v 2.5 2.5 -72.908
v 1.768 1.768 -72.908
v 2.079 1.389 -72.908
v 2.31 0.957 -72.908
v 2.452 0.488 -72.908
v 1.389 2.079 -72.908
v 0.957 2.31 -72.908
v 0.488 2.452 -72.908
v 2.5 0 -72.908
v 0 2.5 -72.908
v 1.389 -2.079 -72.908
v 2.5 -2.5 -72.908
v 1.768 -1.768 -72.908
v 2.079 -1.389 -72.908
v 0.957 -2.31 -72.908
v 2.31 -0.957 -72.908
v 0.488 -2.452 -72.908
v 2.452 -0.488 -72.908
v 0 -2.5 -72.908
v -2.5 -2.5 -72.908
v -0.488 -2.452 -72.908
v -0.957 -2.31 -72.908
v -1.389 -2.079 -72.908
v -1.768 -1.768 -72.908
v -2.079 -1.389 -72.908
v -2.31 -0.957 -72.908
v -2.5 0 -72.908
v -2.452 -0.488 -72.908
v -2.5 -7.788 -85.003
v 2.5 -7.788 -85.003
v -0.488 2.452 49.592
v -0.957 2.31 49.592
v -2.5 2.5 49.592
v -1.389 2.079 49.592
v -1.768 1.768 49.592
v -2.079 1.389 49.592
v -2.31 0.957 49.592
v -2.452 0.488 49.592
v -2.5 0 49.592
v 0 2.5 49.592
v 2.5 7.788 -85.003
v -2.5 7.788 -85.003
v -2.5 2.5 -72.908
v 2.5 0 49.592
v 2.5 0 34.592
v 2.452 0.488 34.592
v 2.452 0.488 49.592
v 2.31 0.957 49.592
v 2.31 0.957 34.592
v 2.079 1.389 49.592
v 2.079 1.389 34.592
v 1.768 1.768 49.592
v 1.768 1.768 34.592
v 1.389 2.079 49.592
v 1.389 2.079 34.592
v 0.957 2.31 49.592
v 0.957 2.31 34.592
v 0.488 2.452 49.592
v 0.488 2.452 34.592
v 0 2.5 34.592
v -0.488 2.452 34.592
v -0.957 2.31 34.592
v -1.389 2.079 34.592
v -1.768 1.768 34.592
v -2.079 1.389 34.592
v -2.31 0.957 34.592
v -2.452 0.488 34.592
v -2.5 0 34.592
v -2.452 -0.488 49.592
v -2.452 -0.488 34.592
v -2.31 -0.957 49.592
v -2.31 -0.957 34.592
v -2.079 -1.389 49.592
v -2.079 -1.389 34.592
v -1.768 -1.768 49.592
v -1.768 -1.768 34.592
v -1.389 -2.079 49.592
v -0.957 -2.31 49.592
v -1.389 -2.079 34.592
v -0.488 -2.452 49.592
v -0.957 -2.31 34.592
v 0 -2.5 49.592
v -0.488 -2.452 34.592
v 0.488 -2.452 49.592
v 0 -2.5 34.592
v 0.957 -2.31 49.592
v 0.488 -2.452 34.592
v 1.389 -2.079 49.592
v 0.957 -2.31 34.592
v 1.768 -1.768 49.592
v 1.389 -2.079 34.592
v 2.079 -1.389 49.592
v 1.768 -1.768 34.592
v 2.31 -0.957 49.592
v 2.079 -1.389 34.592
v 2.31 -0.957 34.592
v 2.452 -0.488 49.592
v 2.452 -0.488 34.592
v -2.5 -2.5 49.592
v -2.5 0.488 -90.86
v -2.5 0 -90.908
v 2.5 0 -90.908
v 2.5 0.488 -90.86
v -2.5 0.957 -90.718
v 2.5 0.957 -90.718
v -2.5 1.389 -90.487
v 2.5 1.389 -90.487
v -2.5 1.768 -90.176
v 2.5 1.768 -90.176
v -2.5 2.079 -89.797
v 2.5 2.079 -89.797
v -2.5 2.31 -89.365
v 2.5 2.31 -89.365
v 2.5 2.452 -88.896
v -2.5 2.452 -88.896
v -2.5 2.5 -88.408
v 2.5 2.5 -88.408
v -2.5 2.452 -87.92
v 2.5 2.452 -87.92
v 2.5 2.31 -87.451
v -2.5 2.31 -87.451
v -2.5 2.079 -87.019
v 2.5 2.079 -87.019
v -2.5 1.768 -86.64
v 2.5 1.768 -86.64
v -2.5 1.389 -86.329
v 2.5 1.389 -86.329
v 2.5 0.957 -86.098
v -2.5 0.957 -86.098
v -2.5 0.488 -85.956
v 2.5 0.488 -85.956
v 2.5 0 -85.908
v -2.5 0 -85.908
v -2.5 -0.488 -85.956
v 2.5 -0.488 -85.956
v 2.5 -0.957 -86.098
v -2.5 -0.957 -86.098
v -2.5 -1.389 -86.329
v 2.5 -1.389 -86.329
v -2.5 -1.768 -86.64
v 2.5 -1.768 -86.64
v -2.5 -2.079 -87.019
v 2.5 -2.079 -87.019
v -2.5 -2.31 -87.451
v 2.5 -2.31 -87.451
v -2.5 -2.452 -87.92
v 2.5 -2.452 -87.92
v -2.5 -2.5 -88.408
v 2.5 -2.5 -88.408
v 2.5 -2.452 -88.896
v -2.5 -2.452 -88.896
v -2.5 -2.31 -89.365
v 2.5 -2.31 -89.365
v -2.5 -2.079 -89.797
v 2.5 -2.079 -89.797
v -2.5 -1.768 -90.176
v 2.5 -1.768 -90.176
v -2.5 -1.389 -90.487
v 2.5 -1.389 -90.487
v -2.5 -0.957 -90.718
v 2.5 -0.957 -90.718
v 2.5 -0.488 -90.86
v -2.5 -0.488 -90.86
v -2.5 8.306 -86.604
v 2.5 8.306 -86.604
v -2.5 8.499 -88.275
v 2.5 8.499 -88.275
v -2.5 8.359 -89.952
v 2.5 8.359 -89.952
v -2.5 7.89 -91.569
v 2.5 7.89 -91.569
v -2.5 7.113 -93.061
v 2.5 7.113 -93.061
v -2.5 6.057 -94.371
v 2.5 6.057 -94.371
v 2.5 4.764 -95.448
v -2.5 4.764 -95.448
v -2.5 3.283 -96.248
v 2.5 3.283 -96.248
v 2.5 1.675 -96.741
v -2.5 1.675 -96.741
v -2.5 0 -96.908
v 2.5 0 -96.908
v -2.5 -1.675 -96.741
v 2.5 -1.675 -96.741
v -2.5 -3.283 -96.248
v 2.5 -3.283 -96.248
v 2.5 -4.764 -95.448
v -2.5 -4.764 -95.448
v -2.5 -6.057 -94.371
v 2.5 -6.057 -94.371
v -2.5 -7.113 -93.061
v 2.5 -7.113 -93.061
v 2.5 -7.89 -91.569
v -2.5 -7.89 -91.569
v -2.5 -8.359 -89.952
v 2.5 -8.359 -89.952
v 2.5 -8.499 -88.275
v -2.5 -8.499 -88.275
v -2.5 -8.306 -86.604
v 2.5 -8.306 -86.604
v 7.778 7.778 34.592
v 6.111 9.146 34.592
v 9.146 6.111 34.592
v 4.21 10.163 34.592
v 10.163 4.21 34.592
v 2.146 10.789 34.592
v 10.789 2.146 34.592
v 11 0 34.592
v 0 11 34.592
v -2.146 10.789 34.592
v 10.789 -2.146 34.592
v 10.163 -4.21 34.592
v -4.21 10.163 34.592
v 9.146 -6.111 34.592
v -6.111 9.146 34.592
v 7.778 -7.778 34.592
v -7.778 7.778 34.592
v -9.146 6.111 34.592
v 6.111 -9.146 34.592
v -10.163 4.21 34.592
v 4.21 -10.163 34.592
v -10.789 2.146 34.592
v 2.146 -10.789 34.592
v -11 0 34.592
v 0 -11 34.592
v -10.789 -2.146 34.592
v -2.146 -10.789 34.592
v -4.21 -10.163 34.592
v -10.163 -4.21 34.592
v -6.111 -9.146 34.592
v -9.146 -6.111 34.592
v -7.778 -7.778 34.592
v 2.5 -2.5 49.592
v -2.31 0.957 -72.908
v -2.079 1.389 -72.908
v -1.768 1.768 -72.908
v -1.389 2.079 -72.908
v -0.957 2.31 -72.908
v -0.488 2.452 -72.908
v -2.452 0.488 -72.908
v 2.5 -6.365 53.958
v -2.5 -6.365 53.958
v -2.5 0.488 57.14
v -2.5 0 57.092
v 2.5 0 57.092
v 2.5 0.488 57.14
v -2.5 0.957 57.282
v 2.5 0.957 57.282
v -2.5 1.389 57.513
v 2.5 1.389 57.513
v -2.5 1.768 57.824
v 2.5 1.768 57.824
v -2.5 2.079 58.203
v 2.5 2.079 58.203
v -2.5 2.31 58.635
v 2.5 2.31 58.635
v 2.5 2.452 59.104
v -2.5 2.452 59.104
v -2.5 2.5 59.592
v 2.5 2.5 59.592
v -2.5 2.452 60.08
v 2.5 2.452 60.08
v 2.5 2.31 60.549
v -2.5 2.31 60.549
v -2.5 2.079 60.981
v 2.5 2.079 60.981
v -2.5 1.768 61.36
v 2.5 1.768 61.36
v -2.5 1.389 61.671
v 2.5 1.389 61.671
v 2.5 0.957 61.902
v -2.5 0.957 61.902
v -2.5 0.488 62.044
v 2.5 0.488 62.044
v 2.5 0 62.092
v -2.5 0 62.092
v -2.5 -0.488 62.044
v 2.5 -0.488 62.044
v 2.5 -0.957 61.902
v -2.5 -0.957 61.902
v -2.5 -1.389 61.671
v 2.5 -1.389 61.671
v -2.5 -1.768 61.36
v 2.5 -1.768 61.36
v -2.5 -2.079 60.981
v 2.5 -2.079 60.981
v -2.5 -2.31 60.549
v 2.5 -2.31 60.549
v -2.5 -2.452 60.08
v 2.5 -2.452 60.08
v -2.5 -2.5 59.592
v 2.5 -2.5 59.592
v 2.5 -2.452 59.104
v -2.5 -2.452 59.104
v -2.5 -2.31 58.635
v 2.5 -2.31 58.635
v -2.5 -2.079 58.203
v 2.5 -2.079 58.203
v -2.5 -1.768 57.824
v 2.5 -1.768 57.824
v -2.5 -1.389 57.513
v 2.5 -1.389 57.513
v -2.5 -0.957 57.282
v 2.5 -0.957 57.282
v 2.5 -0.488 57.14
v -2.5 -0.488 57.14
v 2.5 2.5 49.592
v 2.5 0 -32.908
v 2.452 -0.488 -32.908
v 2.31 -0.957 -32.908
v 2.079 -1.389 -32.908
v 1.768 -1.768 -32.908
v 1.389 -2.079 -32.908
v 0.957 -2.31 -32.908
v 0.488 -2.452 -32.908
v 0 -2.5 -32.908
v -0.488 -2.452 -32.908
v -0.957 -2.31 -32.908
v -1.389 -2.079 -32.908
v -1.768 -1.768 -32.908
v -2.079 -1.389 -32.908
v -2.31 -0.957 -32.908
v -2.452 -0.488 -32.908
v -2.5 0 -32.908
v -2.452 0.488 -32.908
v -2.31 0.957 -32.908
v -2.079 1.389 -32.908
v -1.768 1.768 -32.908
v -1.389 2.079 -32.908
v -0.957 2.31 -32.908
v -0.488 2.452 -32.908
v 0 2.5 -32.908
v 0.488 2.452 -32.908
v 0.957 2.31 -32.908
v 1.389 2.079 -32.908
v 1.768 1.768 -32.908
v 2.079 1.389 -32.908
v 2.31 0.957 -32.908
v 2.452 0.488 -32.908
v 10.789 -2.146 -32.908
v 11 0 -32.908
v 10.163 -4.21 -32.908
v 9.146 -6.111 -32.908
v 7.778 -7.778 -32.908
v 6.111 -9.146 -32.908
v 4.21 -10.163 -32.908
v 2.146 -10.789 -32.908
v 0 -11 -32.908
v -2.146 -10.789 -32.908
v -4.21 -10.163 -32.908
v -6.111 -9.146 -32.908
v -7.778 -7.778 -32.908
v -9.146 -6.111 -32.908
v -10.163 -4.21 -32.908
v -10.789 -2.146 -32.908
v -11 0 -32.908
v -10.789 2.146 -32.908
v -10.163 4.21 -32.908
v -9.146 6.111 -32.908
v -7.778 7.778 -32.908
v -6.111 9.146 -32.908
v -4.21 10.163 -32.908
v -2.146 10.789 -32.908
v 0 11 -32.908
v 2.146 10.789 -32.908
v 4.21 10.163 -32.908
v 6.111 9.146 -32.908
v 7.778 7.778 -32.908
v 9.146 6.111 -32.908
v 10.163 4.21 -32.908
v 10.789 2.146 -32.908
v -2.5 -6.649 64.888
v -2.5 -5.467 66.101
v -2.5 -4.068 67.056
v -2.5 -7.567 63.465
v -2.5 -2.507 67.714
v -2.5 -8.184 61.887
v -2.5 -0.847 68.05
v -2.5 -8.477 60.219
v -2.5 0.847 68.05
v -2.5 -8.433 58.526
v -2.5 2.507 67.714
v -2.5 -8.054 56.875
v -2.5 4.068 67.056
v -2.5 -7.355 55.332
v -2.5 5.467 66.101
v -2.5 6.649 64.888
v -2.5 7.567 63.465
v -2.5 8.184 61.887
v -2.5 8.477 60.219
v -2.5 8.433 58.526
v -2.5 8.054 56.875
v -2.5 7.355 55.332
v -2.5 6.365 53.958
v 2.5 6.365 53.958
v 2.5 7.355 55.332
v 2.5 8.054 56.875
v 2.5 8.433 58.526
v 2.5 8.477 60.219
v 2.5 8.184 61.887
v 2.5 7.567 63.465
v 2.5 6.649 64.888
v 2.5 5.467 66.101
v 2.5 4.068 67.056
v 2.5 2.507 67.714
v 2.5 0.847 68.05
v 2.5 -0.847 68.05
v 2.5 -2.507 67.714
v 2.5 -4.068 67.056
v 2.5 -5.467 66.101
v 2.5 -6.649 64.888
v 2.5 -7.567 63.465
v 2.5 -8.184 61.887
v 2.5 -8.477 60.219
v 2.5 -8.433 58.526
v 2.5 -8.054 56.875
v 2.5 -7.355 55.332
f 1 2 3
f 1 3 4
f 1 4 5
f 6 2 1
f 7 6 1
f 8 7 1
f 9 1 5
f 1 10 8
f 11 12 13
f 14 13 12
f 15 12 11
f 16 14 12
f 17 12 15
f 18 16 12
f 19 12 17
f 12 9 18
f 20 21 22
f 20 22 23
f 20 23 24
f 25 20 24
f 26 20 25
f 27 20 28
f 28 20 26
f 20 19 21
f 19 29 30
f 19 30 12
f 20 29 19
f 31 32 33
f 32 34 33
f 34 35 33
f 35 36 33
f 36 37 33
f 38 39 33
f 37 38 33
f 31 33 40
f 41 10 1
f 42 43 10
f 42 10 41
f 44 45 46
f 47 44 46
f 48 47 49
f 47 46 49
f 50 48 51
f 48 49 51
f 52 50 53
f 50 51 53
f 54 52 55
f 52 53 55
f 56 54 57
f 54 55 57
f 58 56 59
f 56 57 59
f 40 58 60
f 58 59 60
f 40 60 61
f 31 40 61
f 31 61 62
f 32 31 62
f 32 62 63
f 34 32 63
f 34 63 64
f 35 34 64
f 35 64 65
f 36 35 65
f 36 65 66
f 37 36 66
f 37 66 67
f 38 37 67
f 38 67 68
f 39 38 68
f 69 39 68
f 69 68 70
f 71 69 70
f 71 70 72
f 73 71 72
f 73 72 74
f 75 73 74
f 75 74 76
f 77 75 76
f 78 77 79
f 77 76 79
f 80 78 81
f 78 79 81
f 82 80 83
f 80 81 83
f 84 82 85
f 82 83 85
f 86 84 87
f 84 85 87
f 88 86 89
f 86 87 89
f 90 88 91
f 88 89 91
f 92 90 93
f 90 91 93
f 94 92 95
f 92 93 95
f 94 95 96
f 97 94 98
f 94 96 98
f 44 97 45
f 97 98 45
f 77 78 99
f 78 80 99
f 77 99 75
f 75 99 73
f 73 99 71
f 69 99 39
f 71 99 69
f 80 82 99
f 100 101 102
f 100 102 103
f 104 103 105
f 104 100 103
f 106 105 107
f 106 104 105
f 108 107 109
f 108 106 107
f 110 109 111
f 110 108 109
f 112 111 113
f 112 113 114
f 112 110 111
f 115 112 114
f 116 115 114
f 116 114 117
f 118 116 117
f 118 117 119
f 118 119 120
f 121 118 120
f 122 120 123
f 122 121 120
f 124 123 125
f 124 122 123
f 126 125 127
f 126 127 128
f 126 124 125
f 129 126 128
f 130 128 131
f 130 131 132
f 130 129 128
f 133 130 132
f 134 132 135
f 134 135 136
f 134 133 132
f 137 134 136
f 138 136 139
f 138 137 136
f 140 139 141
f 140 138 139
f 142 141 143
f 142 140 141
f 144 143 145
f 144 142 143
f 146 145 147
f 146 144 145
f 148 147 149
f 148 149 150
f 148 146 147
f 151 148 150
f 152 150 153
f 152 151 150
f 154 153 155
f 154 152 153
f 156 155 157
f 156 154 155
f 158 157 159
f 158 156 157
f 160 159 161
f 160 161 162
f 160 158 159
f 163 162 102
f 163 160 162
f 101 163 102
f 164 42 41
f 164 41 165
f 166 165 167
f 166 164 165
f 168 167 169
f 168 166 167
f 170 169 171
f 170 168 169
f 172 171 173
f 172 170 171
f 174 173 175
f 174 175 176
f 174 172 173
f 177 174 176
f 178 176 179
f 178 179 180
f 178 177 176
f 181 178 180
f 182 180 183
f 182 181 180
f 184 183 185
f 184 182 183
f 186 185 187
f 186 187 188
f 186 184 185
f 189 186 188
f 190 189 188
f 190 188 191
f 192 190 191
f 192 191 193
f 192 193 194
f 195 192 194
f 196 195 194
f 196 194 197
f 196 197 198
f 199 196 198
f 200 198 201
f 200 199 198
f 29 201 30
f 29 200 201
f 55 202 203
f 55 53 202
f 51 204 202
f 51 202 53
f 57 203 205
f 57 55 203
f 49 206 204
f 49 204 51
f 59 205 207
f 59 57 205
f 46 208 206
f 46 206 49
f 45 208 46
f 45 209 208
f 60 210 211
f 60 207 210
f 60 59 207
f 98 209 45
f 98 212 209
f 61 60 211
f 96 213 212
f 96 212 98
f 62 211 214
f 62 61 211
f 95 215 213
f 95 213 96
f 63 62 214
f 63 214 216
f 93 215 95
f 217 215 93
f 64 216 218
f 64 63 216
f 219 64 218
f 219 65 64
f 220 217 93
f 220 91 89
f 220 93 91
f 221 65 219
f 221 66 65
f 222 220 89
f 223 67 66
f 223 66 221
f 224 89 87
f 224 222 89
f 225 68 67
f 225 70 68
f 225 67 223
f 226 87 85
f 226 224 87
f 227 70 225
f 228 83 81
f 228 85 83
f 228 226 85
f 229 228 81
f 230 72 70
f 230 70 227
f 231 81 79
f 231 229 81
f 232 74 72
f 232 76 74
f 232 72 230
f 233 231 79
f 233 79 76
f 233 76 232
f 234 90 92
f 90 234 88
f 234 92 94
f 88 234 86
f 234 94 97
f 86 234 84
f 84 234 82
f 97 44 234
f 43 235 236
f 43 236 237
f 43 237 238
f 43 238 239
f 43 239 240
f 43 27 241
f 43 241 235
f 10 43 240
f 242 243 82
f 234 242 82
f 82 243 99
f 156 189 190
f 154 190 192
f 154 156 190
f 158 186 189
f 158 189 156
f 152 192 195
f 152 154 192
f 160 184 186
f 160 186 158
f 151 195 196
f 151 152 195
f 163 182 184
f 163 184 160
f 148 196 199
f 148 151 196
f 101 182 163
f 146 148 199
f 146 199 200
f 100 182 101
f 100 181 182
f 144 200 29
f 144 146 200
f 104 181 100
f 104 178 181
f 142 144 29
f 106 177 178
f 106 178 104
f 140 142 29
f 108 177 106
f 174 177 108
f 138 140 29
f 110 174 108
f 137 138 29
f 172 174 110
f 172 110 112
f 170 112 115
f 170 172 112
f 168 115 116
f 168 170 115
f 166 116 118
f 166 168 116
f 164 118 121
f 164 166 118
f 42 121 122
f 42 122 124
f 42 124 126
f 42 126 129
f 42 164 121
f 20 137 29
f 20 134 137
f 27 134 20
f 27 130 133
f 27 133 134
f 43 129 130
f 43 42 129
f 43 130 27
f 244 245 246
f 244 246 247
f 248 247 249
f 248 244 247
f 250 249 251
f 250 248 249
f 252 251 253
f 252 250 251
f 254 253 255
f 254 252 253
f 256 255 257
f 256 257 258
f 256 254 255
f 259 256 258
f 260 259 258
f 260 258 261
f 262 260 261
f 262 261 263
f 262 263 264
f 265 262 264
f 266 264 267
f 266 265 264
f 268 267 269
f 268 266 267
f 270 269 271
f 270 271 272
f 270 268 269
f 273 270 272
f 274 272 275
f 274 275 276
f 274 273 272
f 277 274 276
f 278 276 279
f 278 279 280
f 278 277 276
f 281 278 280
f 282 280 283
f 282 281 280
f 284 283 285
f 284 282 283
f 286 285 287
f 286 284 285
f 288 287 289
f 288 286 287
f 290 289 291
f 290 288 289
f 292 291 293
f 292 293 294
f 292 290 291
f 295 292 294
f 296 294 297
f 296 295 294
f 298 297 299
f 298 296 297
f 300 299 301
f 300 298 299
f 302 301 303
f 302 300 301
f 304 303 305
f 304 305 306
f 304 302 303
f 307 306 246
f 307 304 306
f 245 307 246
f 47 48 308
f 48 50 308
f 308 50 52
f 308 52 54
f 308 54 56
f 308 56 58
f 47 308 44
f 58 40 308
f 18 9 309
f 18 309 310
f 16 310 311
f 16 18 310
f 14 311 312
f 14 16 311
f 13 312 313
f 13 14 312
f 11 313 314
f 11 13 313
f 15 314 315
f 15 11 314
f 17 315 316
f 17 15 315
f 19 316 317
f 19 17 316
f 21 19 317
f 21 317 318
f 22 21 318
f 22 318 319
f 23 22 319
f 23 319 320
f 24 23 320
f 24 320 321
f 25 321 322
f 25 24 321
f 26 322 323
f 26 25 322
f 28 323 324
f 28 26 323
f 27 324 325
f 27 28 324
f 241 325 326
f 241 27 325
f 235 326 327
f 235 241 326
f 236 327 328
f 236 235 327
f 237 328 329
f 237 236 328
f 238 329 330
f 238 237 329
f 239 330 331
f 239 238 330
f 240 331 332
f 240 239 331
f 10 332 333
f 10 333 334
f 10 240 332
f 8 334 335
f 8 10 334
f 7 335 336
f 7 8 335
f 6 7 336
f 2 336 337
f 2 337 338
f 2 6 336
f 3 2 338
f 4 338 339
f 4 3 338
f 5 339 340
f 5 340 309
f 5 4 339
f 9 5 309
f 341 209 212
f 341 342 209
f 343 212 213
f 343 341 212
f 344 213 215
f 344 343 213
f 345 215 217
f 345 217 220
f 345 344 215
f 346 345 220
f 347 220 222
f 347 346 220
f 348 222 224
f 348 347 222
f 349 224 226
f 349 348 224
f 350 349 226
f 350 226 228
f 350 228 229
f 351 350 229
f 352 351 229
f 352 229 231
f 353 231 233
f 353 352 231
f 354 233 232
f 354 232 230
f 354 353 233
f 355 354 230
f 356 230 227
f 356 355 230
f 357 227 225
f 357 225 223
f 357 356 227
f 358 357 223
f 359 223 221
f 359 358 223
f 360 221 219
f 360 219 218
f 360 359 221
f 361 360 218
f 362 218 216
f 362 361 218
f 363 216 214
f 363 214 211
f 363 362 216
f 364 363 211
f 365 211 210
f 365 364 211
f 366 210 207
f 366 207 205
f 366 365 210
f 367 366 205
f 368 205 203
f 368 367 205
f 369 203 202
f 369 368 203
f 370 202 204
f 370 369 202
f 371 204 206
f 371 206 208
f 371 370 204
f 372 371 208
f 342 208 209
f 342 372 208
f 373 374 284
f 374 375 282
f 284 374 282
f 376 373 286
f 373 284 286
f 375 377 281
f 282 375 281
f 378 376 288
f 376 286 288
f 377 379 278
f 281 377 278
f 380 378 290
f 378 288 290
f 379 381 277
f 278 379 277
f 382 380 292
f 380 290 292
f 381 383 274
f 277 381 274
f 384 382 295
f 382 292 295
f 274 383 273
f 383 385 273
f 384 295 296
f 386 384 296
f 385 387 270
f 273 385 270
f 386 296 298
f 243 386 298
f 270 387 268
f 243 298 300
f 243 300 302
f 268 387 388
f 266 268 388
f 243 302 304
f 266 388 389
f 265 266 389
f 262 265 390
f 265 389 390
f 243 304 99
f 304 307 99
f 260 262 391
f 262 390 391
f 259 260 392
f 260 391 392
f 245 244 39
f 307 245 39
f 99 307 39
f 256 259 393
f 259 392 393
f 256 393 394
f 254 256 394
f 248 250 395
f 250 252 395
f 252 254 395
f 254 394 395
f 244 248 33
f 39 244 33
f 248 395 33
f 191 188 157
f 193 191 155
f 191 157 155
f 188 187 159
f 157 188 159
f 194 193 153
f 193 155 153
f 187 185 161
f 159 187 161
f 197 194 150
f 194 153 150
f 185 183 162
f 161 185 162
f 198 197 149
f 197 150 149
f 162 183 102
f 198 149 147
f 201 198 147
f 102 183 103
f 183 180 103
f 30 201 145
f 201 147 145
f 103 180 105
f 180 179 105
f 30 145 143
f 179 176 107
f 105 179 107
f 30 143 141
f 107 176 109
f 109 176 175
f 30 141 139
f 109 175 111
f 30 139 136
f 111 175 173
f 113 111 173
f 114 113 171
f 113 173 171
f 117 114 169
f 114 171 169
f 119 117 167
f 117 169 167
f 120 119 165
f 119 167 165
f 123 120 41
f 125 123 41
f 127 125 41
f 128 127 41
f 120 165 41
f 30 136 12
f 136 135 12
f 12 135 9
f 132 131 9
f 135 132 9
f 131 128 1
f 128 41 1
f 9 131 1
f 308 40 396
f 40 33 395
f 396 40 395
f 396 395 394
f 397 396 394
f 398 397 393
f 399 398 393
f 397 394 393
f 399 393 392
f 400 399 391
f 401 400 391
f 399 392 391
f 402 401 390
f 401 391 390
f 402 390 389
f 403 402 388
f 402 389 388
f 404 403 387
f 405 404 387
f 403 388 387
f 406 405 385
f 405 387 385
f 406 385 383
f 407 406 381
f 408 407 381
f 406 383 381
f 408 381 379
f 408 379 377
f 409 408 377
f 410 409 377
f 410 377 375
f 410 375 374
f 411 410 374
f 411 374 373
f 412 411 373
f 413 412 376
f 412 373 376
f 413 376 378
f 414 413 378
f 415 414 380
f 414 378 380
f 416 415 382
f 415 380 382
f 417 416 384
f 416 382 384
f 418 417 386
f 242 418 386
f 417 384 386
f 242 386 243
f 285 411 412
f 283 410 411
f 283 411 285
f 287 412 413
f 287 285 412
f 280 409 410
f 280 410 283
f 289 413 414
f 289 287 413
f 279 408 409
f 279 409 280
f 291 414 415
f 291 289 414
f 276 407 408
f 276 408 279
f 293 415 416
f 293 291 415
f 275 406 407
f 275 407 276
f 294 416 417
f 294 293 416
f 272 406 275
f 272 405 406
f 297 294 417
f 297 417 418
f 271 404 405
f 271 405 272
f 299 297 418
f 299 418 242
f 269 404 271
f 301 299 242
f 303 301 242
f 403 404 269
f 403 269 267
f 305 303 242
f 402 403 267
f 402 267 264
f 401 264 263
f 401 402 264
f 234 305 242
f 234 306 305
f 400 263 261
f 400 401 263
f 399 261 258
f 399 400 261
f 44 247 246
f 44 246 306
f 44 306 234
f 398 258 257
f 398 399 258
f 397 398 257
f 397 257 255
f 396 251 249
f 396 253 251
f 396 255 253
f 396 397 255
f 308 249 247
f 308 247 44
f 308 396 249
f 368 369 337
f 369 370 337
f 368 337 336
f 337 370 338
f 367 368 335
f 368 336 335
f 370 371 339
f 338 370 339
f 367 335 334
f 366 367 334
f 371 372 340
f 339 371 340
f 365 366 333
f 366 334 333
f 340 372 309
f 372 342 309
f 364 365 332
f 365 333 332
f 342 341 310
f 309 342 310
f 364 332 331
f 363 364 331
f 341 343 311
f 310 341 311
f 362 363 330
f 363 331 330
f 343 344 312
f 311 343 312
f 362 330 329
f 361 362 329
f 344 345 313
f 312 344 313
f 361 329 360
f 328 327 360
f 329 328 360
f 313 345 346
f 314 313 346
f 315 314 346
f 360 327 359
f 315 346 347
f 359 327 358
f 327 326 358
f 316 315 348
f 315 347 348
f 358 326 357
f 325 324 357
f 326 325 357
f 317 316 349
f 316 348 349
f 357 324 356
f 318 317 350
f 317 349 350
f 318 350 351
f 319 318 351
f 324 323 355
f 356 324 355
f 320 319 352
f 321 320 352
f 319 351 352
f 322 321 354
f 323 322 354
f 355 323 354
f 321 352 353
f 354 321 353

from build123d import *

# Parameters (mm, degrees)
SKETCH1_W                = 67.5
SKETCH1_H                = 11
SKETCH2_R                = 2.5
BOSS_EXTRUDE1_DEPTH      = 15
BOSS_EXTRUDE2_DEPTH      = 2.5
BOSS_EXTRUDE2_DEPTH_BACK = 2.5
SKETCH3_R                = 2.5
BOSS_EXTRUDE3_START      = 40
SKETCH4_R                = 2.5
BOSS_EXTRUDE3_DEPTH      = 40
BOSS_EXTRUDE4_DEPTH      = 2.5
BOSS_EXTRUDE4_DEPTH_BACK = 2.5
SKETCH5_R                = 2.5


with BuildPart() as part:
    # Sketch1 → Revolve1 (revolve)
    with BuildSketch(Plane(origin=(0, 0, 0), x_dir=(0, 0, -1), z_dir=(1, 0, 0)), mode=Mode.PRIVATE) as revolve1_sk:
        with Locations((-0.842105263, 5.5)):
            Rectangle(SKETCH1_W, SKETCH1_H)
    revolve(revolve1_sk.sketch.rotate(Axis((0, 0, 34.592105263), (0, 0, -1)), 90), axis=Axis((0, 0, 34.592105263), (0, 0, -1)))

    # Sketch2 → Boss-Extrude1 (add)
    with BuildSketch(Plane.XY.offset(34.592105263)):
        Circle(SKETCH2_R)
    extrude(amount=BOSS_EXTRUDE1_DEPTH)

    # Sketch3 → Boss-Extrude2 (add, two sides: drawn at the far end of the back side and taken through both)
    with BuildSketch(Plane(origin=(0, 0, 0), x_dir=(0, 0, -1), z_dir=(1, 0, 0)).offset(-BOSS_EXTRUDE2_DEPTH_BACK)):
        with BuildLine():
            Line((-49.592105263, 2.5), (-53.958295642, 6.364761516))
            ThreePointArc((-53.958295642, 6.364761516), (-68.092105263, 0), (-53.958295642, -6.364761516))
            Line((-53.958295642, -6.364761516), (-49.592105263, -2.5))
            Line((-49.592105263, -2.5), (-49.592105263, 2.5))
        make_face()
        with Locations((-59.592105263, 0)):
            Circle(SKETCH3_R, mode=Mode.SUBTRACT)
    extrude(amount=BOSS_EXTRUDE2_DEPTH + BOSS_EXTRUDE2_DEPTH_BACK)

    # Sketch4 → Boss-Extrude3 (add)
    with BuildSketch(Plane(origin=(0, 0, -32.907894737), x_dir=(-1, 0, 0), z_dir=(0, 0, -1)).offset(BOSS_EXTRUDE3_START)):
        with Locations(Location((0, 0, 0), (0, 0, 180))):
            Circle(SKETCH4_R)
    extrude(amount=-BOSS_EXTRUDE3_DEPTH)

    # Sketch5 → Boss-Extrude4 (add, two sides: drawn at the far end of the back side and taken through both)
    with BuildSketch(Plane(origin=(0, 0, 0), x_dir=(0, 0, -1), z_dir=(1, 0, 0)).offset(-BOSS_EXTRUDE4_DEPTH_BACK)):
        with BuildLine():
            Line((72.907894737, 2.5), (85.002754977, 7.788133487))
            ThreePointArc((85.002754977, 7.788133487), (96.907894737, 0), (85.002754977, -7.788133487))
            Line((85.002754977, -7.788133487), (72.907894737, -2.5))
            Line((72.907894737, -2.5), (72.907894737, 2.5))
        make_face()
        with Locations((88.407894737, 0)):
            Circle(SKETCH5_R, mode=Mode.SUBTRACT)
    extrude(amount=BOSS_EXTRUDE4_DEPTH + BOSS_EXTRUDE4_DEPTH_BACK)


solid = part.part
